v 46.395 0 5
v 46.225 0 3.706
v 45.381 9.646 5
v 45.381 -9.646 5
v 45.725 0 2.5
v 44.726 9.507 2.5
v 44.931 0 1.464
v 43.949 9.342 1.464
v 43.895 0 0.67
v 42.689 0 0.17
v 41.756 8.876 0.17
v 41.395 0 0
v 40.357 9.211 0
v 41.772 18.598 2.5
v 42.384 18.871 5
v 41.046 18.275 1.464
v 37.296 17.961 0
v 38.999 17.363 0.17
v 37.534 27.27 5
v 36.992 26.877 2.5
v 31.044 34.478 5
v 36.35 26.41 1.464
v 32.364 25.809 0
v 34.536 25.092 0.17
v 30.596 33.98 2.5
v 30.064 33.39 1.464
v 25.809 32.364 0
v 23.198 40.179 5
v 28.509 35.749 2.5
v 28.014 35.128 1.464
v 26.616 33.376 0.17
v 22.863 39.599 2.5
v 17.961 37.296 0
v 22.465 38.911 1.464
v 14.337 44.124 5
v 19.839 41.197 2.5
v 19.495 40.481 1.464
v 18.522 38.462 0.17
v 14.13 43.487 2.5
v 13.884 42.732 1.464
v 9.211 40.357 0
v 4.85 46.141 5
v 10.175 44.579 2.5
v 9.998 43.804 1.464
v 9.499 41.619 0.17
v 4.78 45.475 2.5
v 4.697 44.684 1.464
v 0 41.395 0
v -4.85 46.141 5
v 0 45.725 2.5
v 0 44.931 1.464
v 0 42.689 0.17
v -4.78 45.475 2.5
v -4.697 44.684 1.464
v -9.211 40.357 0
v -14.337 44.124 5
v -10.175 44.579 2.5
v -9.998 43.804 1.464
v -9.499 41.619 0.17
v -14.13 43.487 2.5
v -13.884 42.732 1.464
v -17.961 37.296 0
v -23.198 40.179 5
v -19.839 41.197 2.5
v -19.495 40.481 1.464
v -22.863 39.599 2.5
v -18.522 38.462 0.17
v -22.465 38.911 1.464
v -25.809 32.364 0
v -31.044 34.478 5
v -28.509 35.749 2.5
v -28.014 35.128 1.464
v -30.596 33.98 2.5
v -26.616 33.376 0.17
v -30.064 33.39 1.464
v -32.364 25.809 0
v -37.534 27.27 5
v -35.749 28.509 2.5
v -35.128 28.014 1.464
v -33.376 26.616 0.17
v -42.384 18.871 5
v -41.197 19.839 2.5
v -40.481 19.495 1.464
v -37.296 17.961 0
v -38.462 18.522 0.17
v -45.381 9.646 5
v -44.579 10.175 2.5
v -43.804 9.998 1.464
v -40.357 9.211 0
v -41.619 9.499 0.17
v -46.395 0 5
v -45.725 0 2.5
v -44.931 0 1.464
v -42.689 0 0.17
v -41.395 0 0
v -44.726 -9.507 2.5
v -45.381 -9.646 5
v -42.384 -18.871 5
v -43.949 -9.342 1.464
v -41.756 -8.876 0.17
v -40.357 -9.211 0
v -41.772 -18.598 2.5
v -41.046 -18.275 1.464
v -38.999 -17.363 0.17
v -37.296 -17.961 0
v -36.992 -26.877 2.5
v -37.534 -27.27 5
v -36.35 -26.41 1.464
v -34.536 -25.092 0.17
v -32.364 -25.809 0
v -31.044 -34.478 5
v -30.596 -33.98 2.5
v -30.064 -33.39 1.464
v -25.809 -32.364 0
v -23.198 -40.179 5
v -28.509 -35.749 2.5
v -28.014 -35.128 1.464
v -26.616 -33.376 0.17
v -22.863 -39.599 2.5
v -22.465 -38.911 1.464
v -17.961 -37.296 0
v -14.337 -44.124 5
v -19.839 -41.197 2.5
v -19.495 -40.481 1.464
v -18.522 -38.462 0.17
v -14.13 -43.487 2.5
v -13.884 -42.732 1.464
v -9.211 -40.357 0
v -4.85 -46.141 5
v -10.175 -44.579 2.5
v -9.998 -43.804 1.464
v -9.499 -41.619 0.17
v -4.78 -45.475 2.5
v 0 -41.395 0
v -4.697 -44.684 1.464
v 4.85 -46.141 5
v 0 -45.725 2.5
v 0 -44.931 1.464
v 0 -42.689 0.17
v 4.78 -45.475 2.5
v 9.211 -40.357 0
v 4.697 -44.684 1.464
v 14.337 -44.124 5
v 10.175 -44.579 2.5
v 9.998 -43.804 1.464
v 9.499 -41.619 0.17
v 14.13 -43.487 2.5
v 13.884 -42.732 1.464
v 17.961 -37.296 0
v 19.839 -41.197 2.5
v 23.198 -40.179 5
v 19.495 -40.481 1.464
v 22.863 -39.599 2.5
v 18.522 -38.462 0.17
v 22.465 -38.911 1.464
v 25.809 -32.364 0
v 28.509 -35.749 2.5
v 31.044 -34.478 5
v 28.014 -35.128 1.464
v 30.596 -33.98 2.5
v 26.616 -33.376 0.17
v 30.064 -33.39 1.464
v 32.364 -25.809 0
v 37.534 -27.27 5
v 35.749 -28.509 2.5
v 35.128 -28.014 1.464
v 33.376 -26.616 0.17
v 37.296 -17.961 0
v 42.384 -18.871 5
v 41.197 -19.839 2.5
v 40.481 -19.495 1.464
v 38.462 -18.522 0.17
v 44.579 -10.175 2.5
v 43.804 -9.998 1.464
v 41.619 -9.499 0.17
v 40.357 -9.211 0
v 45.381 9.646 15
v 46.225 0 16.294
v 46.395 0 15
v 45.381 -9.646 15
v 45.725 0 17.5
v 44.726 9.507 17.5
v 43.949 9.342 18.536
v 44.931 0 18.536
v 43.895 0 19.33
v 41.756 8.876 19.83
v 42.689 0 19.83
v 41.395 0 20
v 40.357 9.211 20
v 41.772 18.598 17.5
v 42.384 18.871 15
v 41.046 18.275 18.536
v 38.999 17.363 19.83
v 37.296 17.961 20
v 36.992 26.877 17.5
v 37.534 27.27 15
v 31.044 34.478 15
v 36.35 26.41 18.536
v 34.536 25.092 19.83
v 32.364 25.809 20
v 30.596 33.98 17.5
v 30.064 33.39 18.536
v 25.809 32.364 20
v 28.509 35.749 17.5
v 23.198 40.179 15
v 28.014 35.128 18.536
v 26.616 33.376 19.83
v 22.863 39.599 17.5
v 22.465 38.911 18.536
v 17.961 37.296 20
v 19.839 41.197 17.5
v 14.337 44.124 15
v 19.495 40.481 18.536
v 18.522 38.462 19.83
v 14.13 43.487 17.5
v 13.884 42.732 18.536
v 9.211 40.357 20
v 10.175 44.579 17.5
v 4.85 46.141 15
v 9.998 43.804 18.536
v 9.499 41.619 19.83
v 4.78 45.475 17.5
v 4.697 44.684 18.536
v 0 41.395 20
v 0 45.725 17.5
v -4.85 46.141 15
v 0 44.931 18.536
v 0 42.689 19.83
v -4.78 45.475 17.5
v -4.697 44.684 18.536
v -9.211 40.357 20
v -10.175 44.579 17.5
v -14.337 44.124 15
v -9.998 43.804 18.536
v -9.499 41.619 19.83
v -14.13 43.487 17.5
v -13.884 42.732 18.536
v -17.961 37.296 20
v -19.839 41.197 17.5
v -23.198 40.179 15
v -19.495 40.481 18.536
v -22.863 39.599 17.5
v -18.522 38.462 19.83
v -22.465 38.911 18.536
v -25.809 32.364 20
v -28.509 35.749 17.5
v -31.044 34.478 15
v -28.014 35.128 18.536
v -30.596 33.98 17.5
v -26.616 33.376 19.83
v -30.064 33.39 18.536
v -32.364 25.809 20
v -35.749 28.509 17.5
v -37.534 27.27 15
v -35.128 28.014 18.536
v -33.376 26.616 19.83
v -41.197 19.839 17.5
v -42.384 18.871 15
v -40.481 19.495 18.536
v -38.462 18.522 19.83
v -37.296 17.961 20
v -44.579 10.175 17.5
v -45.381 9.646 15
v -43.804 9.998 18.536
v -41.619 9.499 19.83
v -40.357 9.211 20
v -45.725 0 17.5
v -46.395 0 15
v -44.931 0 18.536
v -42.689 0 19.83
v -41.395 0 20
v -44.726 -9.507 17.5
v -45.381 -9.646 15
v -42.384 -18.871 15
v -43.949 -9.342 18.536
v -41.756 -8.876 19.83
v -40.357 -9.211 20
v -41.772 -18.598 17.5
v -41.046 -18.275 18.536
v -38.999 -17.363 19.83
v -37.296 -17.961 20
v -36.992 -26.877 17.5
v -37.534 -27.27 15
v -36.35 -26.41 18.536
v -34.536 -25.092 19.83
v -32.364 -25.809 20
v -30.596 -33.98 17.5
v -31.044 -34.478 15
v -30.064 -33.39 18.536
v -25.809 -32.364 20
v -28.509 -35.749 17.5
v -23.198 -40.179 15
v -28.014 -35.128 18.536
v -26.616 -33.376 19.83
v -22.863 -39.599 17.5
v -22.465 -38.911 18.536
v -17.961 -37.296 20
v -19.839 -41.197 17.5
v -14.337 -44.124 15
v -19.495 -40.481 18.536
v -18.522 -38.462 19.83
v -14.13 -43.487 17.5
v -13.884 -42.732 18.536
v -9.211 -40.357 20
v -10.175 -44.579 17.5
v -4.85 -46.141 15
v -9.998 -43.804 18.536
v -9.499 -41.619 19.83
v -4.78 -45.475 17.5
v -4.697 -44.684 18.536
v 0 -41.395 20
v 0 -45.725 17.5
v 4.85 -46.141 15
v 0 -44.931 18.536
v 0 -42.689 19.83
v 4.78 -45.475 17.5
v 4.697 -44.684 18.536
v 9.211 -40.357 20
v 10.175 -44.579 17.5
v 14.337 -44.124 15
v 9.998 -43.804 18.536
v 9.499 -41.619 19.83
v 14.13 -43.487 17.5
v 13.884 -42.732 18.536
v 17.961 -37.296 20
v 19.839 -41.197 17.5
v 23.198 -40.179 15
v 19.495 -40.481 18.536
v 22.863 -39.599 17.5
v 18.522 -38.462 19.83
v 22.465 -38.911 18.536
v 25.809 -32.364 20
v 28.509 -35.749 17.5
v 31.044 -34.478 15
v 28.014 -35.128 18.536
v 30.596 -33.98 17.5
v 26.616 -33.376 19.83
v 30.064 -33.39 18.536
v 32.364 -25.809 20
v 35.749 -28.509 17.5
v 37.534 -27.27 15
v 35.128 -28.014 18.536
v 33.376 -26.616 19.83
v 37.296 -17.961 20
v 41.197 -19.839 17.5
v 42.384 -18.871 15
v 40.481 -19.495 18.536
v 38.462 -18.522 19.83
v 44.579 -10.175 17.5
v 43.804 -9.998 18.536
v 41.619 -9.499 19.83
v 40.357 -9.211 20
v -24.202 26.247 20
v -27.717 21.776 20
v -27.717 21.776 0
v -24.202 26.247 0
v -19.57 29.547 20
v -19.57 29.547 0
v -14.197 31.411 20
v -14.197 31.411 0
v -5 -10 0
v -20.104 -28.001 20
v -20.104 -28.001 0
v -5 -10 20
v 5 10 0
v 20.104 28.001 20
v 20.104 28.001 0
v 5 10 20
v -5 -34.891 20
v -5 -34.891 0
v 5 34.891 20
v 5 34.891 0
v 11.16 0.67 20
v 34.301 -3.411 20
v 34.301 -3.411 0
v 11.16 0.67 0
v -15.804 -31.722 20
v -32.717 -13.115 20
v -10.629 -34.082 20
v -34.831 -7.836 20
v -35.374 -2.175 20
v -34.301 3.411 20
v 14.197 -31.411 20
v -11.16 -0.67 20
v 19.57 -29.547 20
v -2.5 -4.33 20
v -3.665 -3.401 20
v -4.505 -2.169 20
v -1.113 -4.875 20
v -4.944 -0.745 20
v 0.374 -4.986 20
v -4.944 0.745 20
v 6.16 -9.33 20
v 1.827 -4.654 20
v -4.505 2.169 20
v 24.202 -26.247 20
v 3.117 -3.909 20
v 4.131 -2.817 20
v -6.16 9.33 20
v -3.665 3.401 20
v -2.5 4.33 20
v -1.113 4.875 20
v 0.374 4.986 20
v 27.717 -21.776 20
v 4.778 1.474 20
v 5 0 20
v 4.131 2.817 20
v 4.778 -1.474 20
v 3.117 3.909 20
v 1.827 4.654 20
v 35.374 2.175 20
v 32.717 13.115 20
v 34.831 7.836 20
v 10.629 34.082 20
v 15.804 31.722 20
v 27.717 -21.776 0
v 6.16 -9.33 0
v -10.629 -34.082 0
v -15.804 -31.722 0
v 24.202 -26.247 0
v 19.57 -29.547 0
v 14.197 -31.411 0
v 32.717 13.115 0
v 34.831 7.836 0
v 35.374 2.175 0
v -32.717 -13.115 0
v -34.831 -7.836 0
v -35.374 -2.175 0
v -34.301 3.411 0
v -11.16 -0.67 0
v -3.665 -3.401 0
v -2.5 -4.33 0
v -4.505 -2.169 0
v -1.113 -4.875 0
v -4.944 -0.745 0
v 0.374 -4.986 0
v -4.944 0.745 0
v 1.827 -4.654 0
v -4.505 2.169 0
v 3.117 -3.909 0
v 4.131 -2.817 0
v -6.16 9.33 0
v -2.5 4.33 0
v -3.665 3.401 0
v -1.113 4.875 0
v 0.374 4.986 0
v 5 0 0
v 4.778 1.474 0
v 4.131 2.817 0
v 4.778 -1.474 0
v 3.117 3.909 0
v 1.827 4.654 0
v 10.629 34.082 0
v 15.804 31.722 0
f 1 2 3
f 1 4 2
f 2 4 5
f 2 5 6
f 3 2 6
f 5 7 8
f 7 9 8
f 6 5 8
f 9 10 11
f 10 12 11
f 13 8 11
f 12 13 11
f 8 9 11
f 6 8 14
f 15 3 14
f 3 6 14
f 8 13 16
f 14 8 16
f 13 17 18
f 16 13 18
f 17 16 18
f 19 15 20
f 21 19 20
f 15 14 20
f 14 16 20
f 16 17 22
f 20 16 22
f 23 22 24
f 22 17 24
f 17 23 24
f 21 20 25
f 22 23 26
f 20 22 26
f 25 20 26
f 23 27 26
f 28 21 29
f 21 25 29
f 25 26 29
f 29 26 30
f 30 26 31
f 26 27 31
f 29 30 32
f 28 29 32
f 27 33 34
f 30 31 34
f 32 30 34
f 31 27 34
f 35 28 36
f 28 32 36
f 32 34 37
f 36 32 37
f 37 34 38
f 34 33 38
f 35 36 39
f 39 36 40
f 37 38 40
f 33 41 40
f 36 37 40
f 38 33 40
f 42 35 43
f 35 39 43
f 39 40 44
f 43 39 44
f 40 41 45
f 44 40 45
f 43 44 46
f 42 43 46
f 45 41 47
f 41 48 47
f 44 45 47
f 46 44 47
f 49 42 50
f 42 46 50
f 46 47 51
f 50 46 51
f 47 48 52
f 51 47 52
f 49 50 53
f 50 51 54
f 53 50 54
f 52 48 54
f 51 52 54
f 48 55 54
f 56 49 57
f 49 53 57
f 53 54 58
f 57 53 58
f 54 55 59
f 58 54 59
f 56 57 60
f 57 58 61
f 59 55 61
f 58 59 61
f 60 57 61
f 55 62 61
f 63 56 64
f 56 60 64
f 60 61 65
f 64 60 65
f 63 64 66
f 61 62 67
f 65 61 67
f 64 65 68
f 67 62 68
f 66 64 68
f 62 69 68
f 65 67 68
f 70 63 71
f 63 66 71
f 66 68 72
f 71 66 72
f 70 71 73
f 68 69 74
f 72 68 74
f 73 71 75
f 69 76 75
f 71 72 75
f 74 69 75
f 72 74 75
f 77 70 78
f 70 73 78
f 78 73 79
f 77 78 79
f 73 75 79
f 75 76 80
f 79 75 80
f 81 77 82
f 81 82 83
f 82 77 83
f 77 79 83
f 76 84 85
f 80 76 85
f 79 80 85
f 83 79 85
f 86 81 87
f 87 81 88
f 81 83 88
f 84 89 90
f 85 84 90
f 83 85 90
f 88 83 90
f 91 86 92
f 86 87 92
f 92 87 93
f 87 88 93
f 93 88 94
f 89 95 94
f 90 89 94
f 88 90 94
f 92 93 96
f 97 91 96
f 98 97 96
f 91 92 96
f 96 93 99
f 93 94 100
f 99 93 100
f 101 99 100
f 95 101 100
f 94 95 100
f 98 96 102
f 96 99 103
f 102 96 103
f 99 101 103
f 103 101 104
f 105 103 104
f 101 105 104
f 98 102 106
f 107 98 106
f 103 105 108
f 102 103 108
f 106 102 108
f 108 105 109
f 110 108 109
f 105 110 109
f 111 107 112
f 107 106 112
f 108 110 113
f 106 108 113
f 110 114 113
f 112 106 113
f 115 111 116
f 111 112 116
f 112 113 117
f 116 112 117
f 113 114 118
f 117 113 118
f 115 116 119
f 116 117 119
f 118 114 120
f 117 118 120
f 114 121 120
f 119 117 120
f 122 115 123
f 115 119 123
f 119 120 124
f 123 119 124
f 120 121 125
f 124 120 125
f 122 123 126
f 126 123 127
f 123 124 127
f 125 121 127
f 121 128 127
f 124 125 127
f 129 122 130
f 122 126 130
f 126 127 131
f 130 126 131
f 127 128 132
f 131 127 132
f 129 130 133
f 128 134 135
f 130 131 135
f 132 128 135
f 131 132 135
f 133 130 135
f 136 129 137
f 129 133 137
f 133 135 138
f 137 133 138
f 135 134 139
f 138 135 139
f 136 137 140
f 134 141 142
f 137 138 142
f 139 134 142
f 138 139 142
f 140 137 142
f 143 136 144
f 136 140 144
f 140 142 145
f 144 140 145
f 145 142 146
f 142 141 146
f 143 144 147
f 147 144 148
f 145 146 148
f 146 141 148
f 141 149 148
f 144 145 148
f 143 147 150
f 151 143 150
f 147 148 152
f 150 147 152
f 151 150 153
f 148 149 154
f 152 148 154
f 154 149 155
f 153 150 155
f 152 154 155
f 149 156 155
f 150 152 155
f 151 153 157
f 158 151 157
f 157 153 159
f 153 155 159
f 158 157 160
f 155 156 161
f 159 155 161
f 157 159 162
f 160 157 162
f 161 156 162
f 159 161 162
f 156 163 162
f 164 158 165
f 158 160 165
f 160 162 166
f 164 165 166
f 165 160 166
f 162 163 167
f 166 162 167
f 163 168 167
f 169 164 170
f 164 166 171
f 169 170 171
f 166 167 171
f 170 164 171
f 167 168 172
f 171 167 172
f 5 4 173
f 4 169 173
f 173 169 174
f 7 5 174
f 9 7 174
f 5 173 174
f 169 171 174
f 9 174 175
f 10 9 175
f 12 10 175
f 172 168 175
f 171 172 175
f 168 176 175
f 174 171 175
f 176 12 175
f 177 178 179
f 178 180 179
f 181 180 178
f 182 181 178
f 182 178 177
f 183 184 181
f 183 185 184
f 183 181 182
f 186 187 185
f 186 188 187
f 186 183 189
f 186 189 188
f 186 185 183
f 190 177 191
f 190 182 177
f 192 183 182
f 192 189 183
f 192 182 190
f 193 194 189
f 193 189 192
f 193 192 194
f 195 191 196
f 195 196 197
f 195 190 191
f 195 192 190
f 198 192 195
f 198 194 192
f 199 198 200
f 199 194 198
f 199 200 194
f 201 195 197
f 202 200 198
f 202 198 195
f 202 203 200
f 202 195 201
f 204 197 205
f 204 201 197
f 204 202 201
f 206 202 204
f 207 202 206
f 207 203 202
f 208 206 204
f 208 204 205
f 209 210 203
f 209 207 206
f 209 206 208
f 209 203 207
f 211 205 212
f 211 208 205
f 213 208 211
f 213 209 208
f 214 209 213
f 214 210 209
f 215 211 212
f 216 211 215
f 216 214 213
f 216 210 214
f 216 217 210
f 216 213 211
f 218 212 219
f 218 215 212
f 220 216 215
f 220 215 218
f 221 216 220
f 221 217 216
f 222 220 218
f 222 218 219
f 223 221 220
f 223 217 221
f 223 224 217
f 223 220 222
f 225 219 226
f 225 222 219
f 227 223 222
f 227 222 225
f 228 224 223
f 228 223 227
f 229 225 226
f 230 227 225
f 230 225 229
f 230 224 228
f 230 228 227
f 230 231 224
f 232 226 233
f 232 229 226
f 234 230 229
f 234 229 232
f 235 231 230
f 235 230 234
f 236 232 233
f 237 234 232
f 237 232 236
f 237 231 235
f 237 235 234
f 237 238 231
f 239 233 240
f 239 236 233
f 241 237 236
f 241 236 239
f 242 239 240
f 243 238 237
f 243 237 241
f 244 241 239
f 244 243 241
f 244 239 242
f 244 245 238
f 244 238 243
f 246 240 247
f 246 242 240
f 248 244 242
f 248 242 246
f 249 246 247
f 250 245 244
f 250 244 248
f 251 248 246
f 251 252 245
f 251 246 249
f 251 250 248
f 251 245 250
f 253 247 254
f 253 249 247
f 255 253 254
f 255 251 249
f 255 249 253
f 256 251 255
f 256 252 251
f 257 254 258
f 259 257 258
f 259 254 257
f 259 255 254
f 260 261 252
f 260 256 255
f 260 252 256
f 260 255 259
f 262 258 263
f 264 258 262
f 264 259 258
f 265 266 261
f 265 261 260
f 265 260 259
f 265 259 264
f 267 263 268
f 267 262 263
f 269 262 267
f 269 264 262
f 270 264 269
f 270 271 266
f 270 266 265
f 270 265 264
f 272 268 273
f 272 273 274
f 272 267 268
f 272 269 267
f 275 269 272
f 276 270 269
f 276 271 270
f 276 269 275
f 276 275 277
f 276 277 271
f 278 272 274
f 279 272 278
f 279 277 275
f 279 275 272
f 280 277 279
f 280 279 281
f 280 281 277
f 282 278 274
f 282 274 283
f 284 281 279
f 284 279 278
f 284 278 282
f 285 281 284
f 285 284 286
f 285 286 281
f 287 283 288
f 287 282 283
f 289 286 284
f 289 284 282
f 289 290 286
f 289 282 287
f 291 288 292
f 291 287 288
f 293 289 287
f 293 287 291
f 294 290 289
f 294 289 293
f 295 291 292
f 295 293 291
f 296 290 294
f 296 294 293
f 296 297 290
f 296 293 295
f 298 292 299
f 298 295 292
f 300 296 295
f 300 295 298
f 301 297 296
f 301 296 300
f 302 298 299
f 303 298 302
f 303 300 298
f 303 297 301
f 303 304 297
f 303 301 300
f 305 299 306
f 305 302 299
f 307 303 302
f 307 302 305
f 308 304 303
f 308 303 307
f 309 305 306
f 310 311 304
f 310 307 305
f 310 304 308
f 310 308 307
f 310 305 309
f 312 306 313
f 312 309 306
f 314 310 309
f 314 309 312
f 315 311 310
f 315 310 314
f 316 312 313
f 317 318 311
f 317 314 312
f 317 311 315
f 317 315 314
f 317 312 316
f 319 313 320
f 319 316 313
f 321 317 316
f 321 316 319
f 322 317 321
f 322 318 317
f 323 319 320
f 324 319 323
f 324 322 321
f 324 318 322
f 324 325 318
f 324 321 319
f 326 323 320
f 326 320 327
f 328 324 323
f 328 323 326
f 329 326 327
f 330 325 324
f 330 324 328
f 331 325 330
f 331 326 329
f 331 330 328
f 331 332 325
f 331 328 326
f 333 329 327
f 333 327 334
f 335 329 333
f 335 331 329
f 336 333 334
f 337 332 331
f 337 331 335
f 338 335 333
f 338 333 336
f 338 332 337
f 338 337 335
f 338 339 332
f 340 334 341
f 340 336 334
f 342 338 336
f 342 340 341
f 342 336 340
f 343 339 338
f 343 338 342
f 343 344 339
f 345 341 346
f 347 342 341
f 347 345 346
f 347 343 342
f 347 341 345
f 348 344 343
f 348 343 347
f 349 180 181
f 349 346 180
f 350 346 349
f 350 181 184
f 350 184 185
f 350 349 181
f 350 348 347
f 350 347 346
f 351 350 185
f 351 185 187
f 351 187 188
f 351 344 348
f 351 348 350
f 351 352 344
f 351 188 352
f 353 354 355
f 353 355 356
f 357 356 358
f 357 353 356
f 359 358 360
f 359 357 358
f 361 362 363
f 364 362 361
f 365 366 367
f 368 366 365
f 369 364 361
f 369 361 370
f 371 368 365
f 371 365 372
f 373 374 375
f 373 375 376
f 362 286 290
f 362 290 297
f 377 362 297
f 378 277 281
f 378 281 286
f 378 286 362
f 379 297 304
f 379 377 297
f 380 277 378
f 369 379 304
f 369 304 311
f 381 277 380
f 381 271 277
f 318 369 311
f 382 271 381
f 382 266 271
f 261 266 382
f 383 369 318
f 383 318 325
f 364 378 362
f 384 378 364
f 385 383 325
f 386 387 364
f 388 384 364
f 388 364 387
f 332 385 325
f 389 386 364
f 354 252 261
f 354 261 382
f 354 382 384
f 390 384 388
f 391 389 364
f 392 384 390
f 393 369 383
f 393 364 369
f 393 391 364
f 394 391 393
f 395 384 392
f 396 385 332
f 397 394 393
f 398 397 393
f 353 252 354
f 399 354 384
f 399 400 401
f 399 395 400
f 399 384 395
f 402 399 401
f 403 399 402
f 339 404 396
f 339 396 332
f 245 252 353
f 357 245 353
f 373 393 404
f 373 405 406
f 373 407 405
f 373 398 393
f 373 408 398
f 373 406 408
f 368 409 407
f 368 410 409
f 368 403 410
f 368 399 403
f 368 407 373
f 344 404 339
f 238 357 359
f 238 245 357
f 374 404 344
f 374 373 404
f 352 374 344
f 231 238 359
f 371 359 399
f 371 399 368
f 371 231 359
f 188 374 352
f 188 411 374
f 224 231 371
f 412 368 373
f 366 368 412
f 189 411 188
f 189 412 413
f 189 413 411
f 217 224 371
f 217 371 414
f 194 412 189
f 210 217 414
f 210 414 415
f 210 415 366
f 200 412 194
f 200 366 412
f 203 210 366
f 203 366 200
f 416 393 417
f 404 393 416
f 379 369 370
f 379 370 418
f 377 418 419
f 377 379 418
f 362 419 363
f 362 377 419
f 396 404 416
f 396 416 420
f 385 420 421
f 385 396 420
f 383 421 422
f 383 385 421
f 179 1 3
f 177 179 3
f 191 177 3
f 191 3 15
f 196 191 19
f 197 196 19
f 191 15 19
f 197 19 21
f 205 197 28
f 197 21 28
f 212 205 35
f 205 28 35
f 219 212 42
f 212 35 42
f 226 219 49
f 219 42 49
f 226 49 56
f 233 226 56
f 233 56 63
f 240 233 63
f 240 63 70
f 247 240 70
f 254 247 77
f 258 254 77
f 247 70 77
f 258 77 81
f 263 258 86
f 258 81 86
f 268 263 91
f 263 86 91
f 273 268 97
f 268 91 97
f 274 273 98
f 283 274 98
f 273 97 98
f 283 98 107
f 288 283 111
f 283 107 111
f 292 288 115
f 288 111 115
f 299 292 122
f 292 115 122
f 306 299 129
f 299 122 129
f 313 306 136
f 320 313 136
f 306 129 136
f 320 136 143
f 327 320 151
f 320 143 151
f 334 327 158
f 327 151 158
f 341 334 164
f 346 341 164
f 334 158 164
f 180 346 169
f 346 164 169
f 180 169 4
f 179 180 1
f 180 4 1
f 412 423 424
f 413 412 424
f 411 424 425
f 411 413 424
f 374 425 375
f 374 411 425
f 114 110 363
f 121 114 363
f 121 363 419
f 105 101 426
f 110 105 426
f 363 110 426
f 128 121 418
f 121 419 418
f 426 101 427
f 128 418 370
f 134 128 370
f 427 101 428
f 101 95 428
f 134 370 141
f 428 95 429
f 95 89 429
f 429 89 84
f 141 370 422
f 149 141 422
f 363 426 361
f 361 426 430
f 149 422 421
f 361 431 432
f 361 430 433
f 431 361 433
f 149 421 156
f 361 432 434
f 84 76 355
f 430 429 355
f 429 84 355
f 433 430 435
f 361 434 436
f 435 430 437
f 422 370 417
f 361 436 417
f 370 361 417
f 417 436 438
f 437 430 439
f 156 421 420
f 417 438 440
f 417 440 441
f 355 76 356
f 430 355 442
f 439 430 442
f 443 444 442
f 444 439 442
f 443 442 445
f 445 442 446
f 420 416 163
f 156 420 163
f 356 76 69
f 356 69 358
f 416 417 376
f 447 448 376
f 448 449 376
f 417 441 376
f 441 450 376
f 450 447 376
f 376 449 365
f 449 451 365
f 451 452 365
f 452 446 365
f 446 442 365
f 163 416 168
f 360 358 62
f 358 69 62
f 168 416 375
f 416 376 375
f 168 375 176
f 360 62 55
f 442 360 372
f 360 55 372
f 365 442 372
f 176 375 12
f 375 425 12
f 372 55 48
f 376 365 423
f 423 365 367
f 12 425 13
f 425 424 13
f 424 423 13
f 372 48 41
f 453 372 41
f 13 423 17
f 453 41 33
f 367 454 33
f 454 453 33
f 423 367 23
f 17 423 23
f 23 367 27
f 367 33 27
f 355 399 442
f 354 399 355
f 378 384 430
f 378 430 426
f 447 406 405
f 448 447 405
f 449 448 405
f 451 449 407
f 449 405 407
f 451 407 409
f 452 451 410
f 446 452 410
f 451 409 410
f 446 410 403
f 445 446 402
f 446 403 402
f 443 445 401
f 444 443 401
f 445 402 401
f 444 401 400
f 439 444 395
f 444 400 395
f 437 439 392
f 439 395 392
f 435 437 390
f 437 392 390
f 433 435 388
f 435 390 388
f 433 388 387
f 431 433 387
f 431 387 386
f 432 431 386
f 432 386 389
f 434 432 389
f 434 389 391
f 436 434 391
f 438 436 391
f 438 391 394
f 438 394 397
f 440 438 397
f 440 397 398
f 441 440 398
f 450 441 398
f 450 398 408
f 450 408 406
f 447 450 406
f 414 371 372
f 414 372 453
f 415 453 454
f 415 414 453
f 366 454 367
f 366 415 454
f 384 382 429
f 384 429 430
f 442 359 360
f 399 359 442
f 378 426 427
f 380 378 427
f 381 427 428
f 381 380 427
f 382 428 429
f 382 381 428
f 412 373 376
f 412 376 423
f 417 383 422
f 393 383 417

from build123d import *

# Parameters (mm, degrees)
SKETCH1_R           = 46.395094555
BOSS_EXTRUDE1_DEPTH = 20
FILLET1_R           = 5
SKETCH2_R           = 5
CUT_EXTRUDE1_DEPTH  = 69.593072653
CUT_EXTRUDE2_DEPTH  = 69.593072653


with BuildPart() as part:
    # Sketch1 → Boss-Extrude1 (new body)
    with BuildSketch(Plane.XY):
        Circle(SKETCH1_R)
    extrude(amount=BOSS_EXTRUDE1_DEPTH)

    # Fillet1
    fillet1_edges = [part.edges().sort_by_distance(p)[0] for p in [
        (-46.395094555, 0, 0),
        (-46.395094555, 0, 20),
    ]]
    fillet(fillet1_edges, radius=FILLET1_R)

    # Sketch2 → Cut-Extrude1 (cut, through all)
    with BuildSketch(Plane.XY.offset(20)):
        Circle(SKETCH2_R)
    extrude(amount=-CUT_EXTRUDE1_DEPTH, mode=Mode.SUBTRACT)

    # Sketch3 → Cut-Extrude2 (cut, through all)
    with BuildSketch(Plane.XY.offset(20)):
        with BuildLine():
            Line((5, 10), (5, 34.891061086))
            ThreePointArc((5, 34.891061086), (13.300877708, 33.087088929), (20.104300189, 28.000604014))
            Line((20.104300189, 28.000604014), (5, 10))
        make_face()
        with BuildLine():
            Line((34.301384492, -3.410532682), (11.160254038, 0.669872981))
            Line((11.160254038, 0.669872981), (32.716545265, 13.115403524))
            ThreePointArc((32.716545265, 13.115403524), (35.304698404, 5.024646477), (34.301384492, -3.410532682))
        make_face()
        with BuildLine():
            Line((14.197084303, -31.411136696), (6.160254038, -9.330127019))
            Line((6.160254038, -9.330127019), (27.716545265, -21.775657562))
            ThreePointArc((27.716545265, -21.775657562), (22.003820696, -28.062442452), (14.197084303, -31.411136696))
        make_face()
        with BuildLine():
            Line((-20.104300189, -28.000604014), (-5, -10))
            Line((-5, -10), (-5, -34.891061086))
            ThreePointArc((-5, -34.891061086), (-13.300877708, -33.087088929), (-20.104300189, -28.000604014))
        make_face()
        with BuildLine():
            Line((-34.301384492, 3.410532682), (-11.160254038, -0.669872981))
            Line((-11.160254038, -0.669872981), (-32.716545265, -13.115403524))
            ThreePointArc((-32.716545265, -13.115403524), (-35.304698404, -5.024646477), (-34.301384492, 3.410532682))
        make_face()
        with BuildLine():
            Line((-14.197084303, 31.411136696), (-6.160254038, 9.330127019))
            Line((-6.160254038, 9.330127019), (-27.716545265, 21.775657562))
            ThreePointArc((-27.716545265, 21.775657562), (-22.003820696, 28.062442452), (-14.197084303, 31.411136696))
        make_face()
    extrude(amount=-CUT_EXTRUDE2_DEPTH, mode=Mode.SUBTRACT)


solid = part.part
